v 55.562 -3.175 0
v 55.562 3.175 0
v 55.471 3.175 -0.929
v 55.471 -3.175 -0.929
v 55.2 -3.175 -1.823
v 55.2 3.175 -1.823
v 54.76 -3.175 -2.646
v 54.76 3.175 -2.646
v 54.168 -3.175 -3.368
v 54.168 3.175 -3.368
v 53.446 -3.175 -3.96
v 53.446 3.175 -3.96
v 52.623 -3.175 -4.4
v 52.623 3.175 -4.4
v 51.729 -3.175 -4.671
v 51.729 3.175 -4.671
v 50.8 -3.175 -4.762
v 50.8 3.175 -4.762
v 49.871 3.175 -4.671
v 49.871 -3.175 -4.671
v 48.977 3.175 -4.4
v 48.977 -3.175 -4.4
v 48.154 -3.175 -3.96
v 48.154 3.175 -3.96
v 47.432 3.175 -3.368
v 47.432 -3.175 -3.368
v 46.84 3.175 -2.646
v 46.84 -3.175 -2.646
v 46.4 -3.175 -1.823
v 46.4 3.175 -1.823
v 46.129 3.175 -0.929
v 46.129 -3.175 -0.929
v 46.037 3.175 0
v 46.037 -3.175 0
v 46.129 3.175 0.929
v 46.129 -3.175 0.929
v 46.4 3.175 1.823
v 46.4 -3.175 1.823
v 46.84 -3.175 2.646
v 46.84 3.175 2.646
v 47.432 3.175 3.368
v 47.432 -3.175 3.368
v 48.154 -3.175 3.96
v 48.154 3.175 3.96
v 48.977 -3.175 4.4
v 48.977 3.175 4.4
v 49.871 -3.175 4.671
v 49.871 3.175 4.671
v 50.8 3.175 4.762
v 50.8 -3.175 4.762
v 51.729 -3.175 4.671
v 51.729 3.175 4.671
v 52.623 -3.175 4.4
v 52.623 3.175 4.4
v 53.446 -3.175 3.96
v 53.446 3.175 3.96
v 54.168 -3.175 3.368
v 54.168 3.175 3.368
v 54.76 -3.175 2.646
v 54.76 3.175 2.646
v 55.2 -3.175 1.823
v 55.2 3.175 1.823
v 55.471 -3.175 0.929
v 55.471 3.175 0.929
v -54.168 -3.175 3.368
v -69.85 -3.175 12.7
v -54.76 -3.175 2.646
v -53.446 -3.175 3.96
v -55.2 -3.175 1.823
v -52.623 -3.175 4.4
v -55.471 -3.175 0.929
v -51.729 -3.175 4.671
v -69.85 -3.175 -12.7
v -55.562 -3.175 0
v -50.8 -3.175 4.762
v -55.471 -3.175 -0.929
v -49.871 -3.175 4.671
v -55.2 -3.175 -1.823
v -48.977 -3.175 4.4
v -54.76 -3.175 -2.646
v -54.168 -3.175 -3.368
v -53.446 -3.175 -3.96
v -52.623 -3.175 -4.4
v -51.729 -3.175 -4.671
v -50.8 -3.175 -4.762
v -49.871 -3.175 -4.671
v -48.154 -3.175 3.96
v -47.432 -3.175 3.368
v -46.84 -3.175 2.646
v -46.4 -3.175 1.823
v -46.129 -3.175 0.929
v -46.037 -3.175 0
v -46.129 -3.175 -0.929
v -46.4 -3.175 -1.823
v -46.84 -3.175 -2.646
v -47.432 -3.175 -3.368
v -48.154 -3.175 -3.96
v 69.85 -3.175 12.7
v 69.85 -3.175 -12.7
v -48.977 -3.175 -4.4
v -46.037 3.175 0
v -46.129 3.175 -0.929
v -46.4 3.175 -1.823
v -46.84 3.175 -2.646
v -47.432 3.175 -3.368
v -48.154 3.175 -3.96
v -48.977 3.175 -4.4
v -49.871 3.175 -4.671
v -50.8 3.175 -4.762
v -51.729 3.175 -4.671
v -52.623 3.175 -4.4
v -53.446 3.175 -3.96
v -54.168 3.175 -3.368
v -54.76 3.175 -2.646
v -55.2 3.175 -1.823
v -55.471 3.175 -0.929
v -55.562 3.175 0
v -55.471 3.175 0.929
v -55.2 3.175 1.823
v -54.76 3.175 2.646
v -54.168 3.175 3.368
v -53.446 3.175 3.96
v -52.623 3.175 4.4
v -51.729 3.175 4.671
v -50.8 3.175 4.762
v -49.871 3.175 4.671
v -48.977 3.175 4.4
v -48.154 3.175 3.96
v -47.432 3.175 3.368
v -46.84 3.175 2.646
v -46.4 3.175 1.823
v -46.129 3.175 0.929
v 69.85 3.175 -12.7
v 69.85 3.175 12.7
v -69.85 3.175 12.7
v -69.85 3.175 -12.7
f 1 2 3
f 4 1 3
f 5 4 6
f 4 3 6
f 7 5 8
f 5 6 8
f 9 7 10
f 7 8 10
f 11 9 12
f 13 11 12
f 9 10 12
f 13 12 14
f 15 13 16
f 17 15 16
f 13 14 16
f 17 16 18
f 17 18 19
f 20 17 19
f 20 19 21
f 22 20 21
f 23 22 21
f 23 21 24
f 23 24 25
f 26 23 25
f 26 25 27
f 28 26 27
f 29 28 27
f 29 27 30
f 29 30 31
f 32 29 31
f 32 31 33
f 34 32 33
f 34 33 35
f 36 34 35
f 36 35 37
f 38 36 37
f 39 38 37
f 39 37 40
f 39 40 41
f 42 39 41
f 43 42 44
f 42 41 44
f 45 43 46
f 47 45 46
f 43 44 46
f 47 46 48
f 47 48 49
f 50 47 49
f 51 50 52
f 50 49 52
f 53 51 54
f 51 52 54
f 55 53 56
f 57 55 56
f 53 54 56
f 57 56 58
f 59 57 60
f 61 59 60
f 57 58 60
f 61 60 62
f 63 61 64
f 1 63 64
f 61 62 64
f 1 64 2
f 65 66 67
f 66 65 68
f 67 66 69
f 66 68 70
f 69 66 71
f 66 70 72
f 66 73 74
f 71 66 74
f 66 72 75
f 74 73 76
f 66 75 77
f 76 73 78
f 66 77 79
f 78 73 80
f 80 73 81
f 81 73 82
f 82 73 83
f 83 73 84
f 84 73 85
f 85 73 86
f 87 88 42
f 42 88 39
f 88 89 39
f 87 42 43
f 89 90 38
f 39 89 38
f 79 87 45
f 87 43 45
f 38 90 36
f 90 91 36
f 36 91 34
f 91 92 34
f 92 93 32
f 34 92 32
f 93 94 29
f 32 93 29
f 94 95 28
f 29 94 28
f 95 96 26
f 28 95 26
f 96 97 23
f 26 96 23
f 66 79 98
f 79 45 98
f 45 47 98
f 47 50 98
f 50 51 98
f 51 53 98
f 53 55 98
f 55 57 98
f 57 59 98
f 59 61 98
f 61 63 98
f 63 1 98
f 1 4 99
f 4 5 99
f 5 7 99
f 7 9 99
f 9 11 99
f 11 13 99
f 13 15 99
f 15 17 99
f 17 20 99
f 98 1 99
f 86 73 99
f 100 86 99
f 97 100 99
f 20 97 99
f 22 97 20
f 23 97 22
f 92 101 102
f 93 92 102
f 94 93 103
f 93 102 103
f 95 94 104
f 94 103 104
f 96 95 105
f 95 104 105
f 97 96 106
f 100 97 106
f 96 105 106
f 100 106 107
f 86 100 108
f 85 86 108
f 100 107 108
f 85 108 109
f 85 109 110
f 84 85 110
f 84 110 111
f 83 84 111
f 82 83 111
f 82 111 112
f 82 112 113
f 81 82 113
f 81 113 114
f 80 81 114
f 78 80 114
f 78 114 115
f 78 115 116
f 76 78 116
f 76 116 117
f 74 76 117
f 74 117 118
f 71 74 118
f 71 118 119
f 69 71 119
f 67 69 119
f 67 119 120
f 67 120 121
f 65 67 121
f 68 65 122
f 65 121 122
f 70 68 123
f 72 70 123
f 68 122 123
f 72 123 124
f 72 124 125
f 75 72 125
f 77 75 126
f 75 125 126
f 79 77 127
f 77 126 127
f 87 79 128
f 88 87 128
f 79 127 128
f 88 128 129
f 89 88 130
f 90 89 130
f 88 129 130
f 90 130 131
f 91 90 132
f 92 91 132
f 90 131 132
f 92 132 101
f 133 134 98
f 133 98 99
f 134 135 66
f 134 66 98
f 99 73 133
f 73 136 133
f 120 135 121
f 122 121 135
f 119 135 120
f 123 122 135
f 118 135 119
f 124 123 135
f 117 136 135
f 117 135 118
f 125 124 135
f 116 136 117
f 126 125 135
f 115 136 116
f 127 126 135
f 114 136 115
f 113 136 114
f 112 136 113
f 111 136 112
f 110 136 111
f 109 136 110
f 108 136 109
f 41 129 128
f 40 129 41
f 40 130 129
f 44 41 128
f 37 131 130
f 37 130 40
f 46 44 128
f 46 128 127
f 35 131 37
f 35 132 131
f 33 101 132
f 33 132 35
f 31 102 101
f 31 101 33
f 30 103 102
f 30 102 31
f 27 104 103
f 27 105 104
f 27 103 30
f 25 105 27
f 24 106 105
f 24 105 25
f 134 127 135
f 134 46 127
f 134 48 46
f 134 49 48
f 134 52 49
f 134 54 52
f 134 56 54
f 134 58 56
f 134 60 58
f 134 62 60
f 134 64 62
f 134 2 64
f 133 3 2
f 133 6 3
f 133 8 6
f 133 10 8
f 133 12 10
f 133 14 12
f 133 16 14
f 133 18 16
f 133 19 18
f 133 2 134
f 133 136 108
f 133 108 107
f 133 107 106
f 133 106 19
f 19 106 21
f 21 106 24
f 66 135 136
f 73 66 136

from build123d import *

# Parameters (mm, degrees)
SKETCH1_W           = 139.7
SKETCH1_H           = 25.4
BOSS_EXTRUDE1_DEPTH = 3.175
SKETCH2_R           = 4.7625
CUT_EXTRUDE1_DEPTH  = 7.35


with BuildPart() as part:
    # Sketch1 → Boss-Extrude1 (new body, symmetric)
    with BuildSketch(Plane(origin=(0, 0, 0), x_dir=(1, 0, 0), z_dir=(0, 1, 0))):
        Rectangle(SKETCH1_W, SKETCH1_H)
    extrude(amount=BOSS_EXTRUDE1_DEPTH, both=True)

    # Sketch2 → Cut-Extrude1 (cut, through all)
    with BuildSketch(Plane(origin=(0, 3.175, 0), x_dir=(1, 0, 0), z_dir=(0, 1, 0))):
        with Locations((50.8, 0)):
            Circle(SKETCH2_R)
        with Locations((-50.8, 0)):
            Circle(SKETCH2_R)
    extrude(amount=-CUT_EXTRUDE1_DEPTH, mode=Mode.SUBTRACT)


solid = part.part
